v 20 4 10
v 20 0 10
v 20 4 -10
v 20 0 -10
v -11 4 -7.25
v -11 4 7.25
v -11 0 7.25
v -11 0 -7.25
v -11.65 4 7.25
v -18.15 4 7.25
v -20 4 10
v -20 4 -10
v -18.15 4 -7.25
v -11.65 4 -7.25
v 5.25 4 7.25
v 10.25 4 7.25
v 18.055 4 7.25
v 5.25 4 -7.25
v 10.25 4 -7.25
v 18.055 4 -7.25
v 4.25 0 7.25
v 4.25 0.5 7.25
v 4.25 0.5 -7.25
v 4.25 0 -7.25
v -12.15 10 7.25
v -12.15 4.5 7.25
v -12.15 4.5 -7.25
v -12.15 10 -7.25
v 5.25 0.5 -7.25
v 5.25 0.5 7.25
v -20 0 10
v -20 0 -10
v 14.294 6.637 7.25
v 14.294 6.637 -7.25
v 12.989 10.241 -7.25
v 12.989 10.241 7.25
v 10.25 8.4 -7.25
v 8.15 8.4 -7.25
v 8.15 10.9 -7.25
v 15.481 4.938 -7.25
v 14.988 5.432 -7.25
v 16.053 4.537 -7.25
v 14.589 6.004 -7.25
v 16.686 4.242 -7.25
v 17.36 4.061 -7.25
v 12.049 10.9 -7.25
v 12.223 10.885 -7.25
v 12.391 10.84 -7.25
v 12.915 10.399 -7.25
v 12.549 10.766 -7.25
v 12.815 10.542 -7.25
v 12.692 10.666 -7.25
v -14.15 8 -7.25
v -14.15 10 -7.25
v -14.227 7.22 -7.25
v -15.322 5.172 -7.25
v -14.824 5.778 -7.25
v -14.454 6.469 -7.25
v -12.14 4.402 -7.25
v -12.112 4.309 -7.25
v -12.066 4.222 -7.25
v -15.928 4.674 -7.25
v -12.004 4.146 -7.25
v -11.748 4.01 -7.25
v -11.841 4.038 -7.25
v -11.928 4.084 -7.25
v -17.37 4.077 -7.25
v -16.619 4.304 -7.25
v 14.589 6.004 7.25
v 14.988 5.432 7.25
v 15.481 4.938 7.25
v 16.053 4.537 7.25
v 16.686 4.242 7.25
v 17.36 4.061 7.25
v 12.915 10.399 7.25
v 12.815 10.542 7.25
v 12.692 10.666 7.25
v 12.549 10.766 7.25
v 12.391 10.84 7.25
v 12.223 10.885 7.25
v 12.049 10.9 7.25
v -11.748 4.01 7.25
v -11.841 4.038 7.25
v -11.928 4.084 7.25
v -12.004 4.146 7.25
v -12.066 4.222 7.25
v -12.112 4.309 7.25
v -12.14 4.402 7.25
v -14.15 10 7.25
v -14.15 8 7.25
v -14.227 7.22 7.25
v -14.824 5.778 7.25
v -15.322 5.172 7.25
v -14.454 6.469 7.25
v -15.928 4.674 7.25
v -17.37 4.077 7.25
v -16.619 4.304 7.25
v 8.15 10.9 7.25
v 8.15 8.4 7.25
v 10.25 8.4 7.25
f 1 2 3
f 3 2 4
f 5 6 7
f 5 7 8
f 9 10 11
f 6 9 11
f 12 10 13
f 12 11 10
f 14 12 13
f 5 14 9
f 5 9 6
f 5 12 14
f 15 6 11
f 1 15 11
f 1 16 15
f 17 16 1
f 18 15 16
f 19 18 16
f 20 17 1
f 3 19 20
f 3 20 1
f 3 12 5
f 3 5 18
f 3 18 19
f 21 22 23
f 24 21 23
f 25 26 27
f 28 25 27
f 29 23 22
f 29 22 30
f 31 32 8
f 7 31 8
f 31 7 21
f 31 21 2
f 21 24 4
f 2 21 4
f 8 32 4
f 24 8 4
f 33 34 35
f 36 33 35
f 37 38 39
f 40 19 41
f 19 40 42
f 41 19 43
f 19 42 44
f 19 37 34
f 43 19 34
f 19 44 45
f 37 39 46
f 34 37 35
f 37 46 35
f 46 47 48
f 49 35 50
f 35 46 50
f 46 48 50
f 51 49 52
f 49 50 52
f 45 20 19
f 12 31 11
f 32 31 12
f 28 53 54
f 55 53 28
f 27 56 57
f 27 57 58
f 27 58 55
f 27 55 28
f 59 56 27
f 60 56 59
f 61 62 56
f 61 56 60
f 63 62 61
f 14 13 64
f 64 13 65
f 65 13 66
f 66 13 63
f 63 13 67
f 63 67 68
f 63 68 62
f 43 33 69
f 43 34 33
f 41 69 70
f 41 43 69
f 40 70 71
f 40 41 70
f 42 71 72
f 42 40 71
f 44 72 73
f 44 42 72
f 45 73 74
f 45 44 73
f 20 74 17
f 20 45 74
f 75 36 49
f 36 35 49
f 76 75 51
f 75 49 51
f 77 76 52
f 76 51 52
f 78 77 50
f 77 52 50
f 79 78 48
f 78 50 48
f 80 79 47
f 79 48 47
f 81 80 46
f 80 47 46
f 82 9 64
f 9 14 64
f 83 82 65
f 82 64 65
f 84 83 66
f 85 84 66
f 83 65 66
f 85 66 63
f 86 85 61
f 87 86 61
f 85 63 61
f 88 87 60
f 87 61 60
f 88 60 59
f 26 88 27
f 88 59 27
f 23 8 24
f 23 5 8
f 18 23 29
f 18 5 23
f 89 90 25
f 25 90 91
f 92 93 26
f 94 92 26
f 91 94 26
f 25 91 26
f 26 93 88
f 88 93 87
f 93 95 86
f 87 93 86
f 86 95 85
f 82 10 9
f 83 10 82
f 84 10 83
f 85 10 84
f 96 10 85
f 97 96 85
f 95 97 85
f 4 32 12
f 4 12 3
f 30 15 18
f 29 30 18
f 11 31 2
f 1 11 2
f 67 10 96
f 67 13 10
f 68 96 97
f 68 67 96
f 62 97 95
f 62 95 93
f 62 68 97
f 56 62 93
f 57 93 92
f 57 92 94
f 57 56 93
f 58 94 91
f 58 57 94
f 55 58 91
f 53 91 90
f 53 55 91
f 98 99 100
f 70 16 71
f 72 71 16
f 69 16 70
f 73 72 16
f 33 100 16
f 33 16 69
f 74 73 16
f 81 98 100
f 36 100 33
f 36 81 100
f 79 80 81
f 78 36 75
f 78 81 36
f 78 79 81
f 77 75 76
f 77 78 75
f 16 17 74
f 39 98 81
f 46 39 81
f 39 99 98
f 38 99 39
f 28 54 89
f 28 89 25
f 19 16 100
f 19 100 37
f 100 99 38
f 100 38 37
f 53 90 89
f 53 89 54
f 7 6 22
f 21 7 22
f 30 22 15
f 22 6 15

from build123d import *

# Parameters (mm, degrees)
SKETCH1_W           = 40
SKETCH1_H           = 20
BOSS_EXTRUDE1_DEPTH = 4
SKETCH2_W           = 16.25
SKETCH2_H           = 14.5
CUT_EXTRUDE2_DEPTH  = 3.5
SKETCH3_W           = 15.25
SKETCH3_H           = 14.5
CUT_EXTRUDE3_DEPTH  = 0.5
SKETCH4_W           = 2
SKETCH4_H           = 14.5
BOSS_EXTRUDE2_DEPTH = 6
FILLET1_R           = 4
FILLET2_R           = 0.5
SKETCH5_W           = 2.5
SKETCH5_H           = 14.5
BOSS_EXTRUDE3_DEPTH = 4.4
SKETCH6_W           = 4.6
SKETCH6_H           = 14.5
BOSS_EXTRUDE4_DEPTH = 2.5
BOSS_EXTRUDE5_DEPTH = 14.5
FILLET3_R           = 1
FILLET4_R           = 4


with BuildPart() as part:
    # Sketch1 → Boss-Extrude1 (new body)
    with BuildSketch(Plane(origin=(0, 0, 0), x_dir=(1, 0, 0), z_dir=(0, 1, 0))):
        Rectangle(SKETCH1_W, SKETCH1_H)
    extrude(amount=BOSS_EXTRUDE1_DEPTH)

    # Sketch2 → Cut-Extrude2 (cut)
    with BuildSketch(Plane(origin=(0, 4, 0), x_dir=(1, 0, 0), z_dir=(0, 1, 0))):
        with Locations((-2.875, 0)):
            Rectangle(SKETCH2_W, SKETCH2_H)
    extrude(amount=-CUT_EXTRUDE2_DEPTH, mode=Mode.SUBTRACT)

    # Sketch3 → Cut-Extrude3 (cut)
    with BuildSketch(Plane(origin=(0, 0.5, 0), x_dir=(1, 0, 0), z_dir=(0, 1, 0))):
        with Locations((-3.375, 0)):
            Rectangle(SKETCH3_W, SKETCH3_H)
    extrude(amount=-CUT_EXTRUDE3_DEPTH, mode=Mode.SUBTRACT)

    # Sketch4 → Boss-Extrude2 (add)
    with BuildSketch(Plane(origin=(0, 4, 0), x_dir=(1, 0, 0), z_dir=(0, 1, 0))):
        with Locations((-13.15, 0)):
            Rectangle(SKETCH4_W, SKETCH4_H)
    extrude(amount=BOSS_EXTRUDE2_DEPTH)

    # Fillet1
    fillet1_edges = [part.edges().sort_by_distance(p)[0] for p in [
        (-14.15, 4, 0),
    ]]
    fillet(fillet1_edges, radius=FILLET1_R)

    # Fillet2
    fillet2_edges = [part.edges().sort_by_distance(p)[0] for p in [
        (-12.15, 4, 0),
    ]]
    fillet(fillet2_edges, radius=FILLET2_R)

    # Sketch5 → Boss-Extrude3 (add)
    with BuildSketch(Plane(origin=(0, 4, 0), x_dir=(1, 0, 0), z_dir=(0, 1, 0))):
        with Locations((11.5, 0)):
            Rectangle(SKETCH5_W, SKETCH5_H)
    extrude(amount=BOSS_EXTRUDE3_DEPTH)

    # Sketch6 → Boss-Extrude4 (add)
    with BuildSketch(Plane(origin=(0, 8.4, 0), x_dir=(1, 0, 0), z_dir=(0, 1, 0))):
        with Locations((10.45, 0)):
            Rectangle(SKETCH6_W, SKETCH6_H)
    extrude(amount=BOSS_EXTRUDE4_DEPTH)

    # Sketch7 → Boss-Extrude5 (add)
    with BuildSketch(Plane.XY.offset(7.25)):
        Polygon((12.75, 4), (15.25, 4), (12.75, 10.9), align=None)
    extrude(amount=-BOSS_EXTRUDE5_DEPTH)

    # Fillet3
    fillet3_edges = [part.edges().sort_by_distance(p)[0] for p in [
        (12.75, 10.9, 0),
    ]]
    fillet(fillet3_edges, radius=FILLET3_R)

    # Fillet4
    fillet4_edges = [part.edges().sort_by_distance(p)[0] for p in [
        (15.25, 4, 0),
    ]]
    fillet(fillet4_edges, radius=FILLET4_R)


solid = part.part
